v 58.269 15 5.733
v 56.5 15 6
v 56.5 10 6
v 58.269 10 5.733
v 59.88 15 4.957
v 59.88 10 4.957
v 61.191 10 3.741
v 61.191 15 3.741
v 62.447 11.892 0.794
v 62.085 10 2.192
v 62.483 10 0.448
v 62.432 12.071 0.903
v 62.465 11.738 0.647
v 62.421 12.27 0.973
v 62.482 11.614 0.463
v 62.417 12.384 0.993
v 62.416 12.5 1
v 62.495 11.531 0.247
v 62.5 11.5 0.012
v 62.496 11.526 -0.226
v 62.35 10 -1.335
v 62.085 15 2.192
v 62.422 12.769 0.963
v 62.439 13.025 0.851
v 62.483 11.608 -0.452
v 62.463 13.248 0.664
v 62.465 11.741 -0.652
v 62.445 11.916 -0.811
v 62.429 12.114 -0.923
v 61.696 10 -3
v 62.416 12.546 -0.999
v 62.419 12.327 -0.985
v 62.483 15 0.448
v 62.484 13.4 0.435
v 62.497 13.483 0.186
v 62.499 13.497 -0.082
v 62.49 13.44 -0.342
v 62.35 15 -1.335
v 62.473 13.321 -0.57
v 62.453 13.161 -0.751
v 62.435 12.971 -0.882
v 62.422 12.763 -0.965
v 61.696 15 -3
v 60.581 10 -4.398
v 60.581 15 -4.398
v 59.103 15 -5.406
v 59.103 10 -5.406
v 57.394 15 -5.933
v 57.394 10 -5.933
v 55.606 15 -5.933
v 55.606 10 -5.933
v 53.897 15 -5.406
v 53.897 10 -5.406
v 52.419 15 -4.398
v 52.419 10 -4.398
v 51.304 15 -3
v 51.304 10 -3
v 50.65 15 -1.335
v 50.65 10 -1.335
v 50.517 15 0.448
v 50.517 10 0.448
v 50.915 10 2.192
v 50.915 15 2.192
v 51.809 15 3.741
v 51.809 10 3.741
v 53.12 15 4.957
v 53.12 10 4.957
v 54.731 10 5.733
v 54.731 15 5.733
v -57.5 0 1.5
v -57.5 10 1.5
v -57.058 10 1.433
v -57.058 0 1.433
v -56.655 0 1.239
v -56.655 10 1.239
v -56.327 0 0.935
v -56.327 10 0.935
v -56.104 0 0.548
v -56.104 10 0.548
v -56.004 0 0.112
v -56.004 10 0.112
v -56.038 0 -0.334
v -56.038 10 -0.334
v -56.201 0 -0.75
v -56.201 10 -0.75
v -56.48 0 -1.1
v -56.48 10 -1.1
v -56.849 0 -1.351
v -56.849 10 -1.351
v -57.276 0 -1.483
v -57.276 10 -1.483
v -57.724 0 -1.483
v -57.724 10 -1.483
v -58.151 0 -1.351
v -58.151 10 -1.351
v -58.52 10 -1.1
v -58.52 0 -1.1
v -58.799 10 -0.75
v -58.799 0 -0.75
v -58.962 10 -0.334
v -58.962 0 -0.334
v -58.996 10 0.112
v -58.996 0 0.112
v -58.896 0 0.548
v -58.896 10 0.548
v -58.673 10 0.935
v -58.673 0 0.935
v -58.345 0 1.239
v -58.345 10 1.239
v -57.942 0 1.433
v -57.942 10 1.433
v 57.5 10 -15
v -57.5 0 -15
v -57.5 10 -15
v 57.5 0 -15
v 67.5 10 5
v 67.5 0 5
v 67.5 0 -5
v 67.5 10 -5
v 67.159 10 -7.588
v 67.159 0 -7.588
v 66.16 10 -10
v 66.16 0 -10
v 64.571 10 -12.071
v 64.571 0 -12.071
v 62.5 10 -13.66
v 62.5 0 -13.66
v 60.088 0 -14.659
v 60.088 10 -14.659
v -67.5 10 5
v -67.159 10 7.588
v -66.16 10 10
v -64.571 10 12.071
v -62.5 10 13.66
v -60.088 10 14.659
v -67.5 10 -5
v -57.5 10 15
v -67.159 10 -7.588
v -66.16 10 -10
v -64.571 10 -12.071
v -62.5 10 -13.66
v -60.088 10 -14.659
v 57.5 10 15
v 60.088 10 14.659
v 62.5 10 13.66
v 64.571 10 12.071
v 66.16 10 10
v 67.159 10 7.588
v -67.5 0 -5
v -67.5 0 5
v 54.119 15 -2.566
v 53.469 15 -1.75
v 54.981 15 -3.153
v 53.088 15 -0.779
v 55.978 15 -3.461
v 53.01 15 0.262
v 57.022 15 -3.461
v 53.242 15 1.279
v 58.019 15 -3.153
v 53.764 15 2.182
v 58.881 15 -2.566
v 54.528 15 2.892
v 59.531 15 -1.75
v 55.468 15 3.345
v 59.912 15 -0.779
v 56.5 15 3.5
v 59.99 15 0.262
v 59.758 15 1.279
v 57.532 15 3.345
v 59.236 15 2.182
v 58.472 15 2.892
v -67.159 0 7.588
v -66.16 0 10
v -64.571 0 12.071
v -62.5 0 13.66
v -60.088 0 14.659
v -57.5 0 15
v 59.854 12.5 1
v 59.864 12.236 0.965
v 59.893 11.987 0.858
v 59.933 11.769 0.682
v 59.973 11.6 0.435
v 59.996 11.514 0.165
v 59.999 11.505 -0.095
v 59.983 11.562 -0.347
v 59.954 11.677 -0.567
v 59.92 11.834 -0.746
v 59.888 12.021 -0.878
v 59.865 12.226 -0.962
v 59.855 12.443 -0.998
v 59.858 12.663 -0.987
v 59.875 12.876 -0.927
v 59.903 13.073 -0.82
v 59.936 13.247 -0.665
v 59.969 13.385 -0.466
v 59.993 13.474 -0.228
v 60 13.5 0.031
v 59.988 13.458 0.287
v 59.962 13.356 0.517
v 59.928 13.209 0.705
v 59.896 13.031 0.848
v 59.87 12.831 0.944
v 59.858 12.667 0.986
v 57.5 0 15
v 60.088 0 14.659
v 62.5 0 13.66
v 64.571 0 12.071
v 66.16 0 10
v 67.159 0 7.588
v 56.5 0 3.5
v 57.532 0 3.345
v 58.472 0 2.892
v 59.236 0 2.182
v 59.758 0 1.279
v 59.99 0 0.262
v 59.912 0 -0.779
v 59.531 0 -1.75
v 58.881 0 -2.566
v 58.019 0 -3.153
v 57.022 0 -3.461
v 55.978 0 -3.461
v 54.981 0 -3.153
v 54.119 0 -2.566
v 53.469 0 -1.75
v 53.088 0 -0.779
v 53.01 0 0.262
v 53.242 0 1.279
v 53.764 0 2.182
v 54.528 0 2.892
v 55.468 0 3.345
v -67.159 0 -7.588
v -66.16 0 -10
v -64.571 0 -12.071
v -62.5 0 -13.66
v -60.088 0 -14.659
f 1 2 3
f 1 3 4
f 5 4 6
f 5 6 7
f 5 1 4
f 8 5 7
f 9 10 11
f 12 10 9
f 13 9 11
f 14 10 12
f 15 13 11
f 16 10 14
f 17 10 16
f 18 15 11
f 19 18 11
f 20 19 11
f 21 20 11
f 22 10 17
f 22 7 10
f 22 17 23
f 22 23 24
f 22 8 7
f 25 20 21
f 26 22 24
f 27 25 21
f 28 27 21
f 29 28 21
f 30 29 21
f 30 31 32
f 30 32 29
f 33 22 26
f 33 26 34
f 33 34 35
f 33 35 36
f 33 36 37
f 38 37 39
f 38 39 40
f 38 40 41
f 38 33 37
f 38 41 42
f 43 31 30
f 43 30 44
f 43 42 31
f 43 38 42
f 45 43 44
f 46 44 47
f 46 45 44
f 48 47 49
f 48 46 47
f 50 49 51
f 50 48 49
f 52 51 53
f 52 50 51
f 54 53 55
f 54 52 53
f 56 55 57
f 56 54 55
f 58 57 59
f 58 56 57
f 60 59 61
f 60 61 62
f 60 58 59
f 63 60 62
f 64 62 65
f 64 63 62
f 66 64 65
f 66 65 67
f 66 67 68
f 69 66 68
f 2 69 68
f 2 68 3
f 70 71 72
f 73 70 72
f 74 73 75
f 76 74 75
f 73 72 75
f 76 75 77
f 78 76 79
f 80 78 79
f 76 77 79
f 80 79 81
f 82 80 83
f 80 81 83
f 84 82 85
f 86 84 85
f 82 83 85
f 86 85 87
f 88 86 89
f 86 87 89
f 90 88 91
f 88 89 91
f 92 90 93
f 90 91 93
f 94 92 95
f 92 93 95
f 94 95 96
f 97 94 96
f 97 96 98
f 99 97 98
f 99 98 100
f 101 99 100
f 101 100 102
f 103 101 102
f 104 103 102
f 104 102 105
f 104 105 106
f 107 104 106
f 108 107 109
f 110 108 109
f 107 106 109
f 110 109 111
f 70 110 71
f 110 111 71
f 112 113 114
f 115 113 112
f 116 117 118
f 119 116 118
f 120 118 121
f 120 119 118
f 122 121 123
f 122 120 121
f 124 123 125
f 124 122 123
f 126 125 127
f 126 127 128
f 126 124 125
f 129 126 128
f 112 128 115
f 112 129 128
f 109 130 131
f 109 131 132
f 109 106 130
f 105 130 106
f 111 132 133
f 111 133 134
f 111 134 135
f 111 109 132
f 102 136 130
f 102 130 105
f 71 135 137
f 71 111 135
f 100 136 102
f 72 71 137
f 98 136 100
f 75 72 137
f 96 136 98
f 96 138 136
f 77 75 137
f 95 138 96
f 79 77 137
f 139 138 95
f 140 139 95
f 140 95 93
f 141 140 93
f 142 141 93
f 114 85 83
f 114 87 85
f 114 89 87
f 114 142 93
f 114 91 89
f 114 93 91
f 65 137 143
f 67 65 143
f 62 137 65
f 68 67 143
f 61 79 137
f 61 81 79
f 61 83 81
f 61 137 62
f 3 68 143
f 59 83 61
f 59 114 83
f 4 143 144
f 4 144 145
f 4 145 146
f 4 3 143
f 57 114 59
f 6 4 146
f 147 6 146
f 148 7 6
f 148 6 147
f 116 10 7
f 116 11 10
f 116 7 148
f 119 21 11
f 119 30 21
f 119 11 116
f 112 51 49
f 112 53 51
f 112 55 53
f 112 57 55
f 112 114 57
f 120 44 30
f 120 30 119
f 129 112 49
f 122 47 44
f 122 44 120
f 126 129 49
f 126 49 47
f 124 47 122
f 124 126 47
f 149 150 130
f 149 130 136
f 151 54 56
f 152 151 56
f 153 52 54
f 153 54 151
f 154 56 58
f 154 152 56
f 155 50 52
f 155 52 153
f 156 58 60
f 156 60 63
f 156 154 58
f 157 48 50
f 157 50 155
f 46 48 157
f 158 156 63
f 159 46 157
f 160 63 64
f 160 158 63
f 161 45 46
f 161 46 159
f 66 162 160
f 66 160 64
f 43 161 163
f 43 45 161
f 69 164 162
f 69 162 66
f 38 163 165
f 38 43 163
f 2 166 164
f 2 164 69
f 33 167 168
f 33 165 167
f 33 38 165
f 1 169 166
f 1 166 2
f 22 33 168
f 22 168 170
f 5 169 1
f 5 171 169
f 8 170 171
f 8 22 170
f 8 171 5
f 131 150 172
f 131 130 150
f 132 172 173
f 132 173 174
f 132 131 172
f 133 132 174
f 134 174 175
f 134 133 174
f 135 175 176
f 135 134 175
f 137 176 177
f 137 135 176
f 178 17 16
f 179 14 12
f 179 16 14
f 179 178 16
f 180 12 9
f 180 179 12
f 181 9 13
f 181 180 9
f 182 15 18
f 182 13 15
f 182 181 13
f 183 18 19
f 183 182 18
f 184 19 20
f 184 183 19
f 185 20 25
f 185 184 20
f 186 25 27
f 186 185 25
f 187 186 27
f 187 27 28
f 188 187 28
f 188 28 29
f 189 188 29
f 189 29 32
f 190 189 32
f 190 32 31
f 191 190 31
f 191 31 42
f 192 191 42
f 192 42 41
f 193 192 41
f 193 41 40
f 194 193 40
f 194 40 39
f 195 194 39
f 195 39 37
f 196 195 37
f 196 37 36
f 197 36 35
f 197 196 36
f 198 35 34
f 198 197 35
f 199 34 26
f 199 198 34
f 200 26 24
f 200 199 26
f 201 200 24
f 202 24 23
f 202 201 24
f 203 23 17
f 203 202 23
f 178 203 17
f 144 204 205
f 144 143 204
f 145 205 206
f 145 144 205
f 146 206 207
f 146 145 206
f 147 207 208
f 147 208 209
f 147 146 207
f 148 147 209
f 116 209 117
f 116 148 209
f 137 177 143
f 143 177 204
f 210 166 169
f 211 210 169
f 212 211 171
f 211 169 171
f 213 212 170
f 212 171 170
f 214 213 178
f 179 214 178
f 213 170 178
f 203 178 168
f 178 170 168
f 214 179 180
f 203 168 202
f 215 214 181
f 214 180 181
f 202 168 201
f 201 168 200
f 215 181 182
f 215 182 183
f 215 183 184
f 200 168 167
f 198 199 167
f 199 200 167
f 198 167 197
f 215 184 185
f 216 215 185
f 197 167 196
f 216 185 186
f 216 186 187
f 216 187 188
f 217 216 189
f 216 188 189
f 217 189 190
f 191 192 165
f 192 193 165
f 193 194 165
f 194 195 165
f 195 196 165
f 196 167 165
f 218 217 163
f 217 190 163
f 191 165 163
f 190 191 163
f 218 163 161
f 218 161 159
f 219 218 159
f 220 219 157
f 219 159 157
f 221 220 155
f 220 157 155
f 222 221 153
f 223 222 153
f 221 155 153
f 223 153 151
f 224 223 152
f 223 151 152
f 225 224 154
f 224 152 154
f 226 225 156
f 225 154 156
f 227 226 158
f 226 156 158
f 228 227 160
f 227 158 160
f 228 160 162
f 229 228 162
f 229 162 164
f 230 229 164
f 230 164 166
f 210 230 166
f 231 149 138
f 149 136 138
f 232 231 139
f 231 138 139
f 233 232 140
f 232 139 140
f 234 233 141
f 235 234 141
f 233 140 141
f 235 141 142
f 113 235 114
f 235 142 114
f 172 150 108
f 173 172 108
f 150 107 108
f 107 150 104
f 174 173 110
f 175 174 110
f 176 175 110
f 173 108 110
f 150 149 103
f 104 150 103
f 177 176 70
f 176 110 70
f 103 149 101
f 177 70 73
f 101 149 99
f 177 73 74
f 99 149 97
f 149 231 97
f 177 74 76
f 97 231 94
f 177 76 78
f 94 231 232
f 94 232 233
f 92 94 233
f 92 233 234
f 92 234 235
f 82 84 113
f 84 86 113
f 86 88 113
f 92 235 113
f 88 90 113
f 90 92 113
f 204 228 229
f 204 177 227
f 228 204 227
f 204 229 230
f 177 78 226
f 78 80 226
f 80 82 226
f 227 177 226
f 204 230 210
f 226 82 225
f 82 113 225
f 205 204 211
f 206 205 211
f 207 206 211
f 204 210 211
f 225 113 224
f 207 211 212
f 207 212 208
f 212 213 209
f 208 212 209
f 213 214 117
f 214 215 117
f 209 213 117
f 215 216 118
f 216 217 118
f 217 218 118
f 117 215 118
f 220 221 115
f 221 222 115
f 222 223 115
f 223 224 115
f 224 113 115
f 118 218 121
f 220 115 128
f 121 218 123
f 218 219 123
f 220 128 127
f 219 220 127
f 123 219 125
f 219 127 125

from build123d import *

# Parameters (mm, degrees)
CROQUIS1_W              = 135
CROQUIS1_H              = 30
SALIENTE_EXTRUIR1_DEPTH = 10
REDONDEO3_R             = 10
CROQUIS3_R              = 1.5
CROQUIS3_R_2            = 3.5
CORTAR_EXTRUIR2_DEPTH   = 10
SALIENTE_EXTRUIR2_START = 5
CROQUIS4_R              = 6
CROQUIS4_R_2            = 3.5
SALIENTE_EXTRUIR2_DEPTH = 5
CROQUIS5_R              = 1
CORTAR_EXTRUIR3_DEPTH   = 6


with BuildPart() as part:
    # Croquis1 → Saliente-Extruir1 (new body)
    with BuildSketch(Plane(origin=(0, 0, 0), x_dir=(1, 0, 0), z_dir=(0, 1, 0))):
        Rectangle(CROQUIS1_W, CROQUIS1_H)
    extrude(amount=SALIENTE_EXTRUIR1_DEPTH)

    # Redondeo3
    redondeo3_edges = [part.edges().sort_by_distance(p)[0] for p in [
        (-67.5, 5, -15),
        (67.5, 5, -15),
        (67.5, 5, 15),
        (-67.5, 5, 15),
    ]]
    fillet(redondeo3_edges, radius=REDONDEO3_R)

    # Croquis3 → Cortar-Extruir2 (cut)
    with BuildSketch(Plane(origin=(0, 10, 0), x_dir=(1, 0, 0), z_dir=(0, 1, 0))):
        with Locations(Location((-57.5, 0, 0), (0, 0, 270))):
            Circle(CROQUIS3_R)
        with Locations(Location((56.5, 0, 0), (0, 0, 270))):
            Circle(CROQUIS3_R_2)
    extrude(amount=-CORTAR_EXTRUIR2_DEPTH, mode=Mode.SUBTRACT)

    # Croquis4 → Saliente-Extruir2 (add)
    with BuildSketch(Plane(origin=(0, 10, 0), x_dir=(1, 0, 0), z_dir=(0, 1, 0)).offset(SALIENTE_EXTRUIR2_START)):
        with Locations(Location((56.5, 0, 0), (0, 0, 270))):
            Circle(CROQUIS4_R)
        with Locations(Location((56.5, 0, 0), (0, 0, 270))):
            Circle(CROQUIS4_R_2, mode=Mode.SUBTRACT)
    extrude(amount=-SALIENTE_EXTRUIR2_DEPTH)

    # Croquis5 → Cortar-Extruir3 (cut)
    with BuildSketch(Plane(origin=(56.5, 0, 0), x_dir=(0, 0, -1), z_dir=(1, 0, 0))):
        with Locations(Location((0, 12.5, 0), (0, 0, 180))):
            Circle(CROQUIS5_R)
    extrude(amount=CORTAR_EXTRUIR3_DEPTH, mode=Mode.SUBTRACT)


solid = part.part
